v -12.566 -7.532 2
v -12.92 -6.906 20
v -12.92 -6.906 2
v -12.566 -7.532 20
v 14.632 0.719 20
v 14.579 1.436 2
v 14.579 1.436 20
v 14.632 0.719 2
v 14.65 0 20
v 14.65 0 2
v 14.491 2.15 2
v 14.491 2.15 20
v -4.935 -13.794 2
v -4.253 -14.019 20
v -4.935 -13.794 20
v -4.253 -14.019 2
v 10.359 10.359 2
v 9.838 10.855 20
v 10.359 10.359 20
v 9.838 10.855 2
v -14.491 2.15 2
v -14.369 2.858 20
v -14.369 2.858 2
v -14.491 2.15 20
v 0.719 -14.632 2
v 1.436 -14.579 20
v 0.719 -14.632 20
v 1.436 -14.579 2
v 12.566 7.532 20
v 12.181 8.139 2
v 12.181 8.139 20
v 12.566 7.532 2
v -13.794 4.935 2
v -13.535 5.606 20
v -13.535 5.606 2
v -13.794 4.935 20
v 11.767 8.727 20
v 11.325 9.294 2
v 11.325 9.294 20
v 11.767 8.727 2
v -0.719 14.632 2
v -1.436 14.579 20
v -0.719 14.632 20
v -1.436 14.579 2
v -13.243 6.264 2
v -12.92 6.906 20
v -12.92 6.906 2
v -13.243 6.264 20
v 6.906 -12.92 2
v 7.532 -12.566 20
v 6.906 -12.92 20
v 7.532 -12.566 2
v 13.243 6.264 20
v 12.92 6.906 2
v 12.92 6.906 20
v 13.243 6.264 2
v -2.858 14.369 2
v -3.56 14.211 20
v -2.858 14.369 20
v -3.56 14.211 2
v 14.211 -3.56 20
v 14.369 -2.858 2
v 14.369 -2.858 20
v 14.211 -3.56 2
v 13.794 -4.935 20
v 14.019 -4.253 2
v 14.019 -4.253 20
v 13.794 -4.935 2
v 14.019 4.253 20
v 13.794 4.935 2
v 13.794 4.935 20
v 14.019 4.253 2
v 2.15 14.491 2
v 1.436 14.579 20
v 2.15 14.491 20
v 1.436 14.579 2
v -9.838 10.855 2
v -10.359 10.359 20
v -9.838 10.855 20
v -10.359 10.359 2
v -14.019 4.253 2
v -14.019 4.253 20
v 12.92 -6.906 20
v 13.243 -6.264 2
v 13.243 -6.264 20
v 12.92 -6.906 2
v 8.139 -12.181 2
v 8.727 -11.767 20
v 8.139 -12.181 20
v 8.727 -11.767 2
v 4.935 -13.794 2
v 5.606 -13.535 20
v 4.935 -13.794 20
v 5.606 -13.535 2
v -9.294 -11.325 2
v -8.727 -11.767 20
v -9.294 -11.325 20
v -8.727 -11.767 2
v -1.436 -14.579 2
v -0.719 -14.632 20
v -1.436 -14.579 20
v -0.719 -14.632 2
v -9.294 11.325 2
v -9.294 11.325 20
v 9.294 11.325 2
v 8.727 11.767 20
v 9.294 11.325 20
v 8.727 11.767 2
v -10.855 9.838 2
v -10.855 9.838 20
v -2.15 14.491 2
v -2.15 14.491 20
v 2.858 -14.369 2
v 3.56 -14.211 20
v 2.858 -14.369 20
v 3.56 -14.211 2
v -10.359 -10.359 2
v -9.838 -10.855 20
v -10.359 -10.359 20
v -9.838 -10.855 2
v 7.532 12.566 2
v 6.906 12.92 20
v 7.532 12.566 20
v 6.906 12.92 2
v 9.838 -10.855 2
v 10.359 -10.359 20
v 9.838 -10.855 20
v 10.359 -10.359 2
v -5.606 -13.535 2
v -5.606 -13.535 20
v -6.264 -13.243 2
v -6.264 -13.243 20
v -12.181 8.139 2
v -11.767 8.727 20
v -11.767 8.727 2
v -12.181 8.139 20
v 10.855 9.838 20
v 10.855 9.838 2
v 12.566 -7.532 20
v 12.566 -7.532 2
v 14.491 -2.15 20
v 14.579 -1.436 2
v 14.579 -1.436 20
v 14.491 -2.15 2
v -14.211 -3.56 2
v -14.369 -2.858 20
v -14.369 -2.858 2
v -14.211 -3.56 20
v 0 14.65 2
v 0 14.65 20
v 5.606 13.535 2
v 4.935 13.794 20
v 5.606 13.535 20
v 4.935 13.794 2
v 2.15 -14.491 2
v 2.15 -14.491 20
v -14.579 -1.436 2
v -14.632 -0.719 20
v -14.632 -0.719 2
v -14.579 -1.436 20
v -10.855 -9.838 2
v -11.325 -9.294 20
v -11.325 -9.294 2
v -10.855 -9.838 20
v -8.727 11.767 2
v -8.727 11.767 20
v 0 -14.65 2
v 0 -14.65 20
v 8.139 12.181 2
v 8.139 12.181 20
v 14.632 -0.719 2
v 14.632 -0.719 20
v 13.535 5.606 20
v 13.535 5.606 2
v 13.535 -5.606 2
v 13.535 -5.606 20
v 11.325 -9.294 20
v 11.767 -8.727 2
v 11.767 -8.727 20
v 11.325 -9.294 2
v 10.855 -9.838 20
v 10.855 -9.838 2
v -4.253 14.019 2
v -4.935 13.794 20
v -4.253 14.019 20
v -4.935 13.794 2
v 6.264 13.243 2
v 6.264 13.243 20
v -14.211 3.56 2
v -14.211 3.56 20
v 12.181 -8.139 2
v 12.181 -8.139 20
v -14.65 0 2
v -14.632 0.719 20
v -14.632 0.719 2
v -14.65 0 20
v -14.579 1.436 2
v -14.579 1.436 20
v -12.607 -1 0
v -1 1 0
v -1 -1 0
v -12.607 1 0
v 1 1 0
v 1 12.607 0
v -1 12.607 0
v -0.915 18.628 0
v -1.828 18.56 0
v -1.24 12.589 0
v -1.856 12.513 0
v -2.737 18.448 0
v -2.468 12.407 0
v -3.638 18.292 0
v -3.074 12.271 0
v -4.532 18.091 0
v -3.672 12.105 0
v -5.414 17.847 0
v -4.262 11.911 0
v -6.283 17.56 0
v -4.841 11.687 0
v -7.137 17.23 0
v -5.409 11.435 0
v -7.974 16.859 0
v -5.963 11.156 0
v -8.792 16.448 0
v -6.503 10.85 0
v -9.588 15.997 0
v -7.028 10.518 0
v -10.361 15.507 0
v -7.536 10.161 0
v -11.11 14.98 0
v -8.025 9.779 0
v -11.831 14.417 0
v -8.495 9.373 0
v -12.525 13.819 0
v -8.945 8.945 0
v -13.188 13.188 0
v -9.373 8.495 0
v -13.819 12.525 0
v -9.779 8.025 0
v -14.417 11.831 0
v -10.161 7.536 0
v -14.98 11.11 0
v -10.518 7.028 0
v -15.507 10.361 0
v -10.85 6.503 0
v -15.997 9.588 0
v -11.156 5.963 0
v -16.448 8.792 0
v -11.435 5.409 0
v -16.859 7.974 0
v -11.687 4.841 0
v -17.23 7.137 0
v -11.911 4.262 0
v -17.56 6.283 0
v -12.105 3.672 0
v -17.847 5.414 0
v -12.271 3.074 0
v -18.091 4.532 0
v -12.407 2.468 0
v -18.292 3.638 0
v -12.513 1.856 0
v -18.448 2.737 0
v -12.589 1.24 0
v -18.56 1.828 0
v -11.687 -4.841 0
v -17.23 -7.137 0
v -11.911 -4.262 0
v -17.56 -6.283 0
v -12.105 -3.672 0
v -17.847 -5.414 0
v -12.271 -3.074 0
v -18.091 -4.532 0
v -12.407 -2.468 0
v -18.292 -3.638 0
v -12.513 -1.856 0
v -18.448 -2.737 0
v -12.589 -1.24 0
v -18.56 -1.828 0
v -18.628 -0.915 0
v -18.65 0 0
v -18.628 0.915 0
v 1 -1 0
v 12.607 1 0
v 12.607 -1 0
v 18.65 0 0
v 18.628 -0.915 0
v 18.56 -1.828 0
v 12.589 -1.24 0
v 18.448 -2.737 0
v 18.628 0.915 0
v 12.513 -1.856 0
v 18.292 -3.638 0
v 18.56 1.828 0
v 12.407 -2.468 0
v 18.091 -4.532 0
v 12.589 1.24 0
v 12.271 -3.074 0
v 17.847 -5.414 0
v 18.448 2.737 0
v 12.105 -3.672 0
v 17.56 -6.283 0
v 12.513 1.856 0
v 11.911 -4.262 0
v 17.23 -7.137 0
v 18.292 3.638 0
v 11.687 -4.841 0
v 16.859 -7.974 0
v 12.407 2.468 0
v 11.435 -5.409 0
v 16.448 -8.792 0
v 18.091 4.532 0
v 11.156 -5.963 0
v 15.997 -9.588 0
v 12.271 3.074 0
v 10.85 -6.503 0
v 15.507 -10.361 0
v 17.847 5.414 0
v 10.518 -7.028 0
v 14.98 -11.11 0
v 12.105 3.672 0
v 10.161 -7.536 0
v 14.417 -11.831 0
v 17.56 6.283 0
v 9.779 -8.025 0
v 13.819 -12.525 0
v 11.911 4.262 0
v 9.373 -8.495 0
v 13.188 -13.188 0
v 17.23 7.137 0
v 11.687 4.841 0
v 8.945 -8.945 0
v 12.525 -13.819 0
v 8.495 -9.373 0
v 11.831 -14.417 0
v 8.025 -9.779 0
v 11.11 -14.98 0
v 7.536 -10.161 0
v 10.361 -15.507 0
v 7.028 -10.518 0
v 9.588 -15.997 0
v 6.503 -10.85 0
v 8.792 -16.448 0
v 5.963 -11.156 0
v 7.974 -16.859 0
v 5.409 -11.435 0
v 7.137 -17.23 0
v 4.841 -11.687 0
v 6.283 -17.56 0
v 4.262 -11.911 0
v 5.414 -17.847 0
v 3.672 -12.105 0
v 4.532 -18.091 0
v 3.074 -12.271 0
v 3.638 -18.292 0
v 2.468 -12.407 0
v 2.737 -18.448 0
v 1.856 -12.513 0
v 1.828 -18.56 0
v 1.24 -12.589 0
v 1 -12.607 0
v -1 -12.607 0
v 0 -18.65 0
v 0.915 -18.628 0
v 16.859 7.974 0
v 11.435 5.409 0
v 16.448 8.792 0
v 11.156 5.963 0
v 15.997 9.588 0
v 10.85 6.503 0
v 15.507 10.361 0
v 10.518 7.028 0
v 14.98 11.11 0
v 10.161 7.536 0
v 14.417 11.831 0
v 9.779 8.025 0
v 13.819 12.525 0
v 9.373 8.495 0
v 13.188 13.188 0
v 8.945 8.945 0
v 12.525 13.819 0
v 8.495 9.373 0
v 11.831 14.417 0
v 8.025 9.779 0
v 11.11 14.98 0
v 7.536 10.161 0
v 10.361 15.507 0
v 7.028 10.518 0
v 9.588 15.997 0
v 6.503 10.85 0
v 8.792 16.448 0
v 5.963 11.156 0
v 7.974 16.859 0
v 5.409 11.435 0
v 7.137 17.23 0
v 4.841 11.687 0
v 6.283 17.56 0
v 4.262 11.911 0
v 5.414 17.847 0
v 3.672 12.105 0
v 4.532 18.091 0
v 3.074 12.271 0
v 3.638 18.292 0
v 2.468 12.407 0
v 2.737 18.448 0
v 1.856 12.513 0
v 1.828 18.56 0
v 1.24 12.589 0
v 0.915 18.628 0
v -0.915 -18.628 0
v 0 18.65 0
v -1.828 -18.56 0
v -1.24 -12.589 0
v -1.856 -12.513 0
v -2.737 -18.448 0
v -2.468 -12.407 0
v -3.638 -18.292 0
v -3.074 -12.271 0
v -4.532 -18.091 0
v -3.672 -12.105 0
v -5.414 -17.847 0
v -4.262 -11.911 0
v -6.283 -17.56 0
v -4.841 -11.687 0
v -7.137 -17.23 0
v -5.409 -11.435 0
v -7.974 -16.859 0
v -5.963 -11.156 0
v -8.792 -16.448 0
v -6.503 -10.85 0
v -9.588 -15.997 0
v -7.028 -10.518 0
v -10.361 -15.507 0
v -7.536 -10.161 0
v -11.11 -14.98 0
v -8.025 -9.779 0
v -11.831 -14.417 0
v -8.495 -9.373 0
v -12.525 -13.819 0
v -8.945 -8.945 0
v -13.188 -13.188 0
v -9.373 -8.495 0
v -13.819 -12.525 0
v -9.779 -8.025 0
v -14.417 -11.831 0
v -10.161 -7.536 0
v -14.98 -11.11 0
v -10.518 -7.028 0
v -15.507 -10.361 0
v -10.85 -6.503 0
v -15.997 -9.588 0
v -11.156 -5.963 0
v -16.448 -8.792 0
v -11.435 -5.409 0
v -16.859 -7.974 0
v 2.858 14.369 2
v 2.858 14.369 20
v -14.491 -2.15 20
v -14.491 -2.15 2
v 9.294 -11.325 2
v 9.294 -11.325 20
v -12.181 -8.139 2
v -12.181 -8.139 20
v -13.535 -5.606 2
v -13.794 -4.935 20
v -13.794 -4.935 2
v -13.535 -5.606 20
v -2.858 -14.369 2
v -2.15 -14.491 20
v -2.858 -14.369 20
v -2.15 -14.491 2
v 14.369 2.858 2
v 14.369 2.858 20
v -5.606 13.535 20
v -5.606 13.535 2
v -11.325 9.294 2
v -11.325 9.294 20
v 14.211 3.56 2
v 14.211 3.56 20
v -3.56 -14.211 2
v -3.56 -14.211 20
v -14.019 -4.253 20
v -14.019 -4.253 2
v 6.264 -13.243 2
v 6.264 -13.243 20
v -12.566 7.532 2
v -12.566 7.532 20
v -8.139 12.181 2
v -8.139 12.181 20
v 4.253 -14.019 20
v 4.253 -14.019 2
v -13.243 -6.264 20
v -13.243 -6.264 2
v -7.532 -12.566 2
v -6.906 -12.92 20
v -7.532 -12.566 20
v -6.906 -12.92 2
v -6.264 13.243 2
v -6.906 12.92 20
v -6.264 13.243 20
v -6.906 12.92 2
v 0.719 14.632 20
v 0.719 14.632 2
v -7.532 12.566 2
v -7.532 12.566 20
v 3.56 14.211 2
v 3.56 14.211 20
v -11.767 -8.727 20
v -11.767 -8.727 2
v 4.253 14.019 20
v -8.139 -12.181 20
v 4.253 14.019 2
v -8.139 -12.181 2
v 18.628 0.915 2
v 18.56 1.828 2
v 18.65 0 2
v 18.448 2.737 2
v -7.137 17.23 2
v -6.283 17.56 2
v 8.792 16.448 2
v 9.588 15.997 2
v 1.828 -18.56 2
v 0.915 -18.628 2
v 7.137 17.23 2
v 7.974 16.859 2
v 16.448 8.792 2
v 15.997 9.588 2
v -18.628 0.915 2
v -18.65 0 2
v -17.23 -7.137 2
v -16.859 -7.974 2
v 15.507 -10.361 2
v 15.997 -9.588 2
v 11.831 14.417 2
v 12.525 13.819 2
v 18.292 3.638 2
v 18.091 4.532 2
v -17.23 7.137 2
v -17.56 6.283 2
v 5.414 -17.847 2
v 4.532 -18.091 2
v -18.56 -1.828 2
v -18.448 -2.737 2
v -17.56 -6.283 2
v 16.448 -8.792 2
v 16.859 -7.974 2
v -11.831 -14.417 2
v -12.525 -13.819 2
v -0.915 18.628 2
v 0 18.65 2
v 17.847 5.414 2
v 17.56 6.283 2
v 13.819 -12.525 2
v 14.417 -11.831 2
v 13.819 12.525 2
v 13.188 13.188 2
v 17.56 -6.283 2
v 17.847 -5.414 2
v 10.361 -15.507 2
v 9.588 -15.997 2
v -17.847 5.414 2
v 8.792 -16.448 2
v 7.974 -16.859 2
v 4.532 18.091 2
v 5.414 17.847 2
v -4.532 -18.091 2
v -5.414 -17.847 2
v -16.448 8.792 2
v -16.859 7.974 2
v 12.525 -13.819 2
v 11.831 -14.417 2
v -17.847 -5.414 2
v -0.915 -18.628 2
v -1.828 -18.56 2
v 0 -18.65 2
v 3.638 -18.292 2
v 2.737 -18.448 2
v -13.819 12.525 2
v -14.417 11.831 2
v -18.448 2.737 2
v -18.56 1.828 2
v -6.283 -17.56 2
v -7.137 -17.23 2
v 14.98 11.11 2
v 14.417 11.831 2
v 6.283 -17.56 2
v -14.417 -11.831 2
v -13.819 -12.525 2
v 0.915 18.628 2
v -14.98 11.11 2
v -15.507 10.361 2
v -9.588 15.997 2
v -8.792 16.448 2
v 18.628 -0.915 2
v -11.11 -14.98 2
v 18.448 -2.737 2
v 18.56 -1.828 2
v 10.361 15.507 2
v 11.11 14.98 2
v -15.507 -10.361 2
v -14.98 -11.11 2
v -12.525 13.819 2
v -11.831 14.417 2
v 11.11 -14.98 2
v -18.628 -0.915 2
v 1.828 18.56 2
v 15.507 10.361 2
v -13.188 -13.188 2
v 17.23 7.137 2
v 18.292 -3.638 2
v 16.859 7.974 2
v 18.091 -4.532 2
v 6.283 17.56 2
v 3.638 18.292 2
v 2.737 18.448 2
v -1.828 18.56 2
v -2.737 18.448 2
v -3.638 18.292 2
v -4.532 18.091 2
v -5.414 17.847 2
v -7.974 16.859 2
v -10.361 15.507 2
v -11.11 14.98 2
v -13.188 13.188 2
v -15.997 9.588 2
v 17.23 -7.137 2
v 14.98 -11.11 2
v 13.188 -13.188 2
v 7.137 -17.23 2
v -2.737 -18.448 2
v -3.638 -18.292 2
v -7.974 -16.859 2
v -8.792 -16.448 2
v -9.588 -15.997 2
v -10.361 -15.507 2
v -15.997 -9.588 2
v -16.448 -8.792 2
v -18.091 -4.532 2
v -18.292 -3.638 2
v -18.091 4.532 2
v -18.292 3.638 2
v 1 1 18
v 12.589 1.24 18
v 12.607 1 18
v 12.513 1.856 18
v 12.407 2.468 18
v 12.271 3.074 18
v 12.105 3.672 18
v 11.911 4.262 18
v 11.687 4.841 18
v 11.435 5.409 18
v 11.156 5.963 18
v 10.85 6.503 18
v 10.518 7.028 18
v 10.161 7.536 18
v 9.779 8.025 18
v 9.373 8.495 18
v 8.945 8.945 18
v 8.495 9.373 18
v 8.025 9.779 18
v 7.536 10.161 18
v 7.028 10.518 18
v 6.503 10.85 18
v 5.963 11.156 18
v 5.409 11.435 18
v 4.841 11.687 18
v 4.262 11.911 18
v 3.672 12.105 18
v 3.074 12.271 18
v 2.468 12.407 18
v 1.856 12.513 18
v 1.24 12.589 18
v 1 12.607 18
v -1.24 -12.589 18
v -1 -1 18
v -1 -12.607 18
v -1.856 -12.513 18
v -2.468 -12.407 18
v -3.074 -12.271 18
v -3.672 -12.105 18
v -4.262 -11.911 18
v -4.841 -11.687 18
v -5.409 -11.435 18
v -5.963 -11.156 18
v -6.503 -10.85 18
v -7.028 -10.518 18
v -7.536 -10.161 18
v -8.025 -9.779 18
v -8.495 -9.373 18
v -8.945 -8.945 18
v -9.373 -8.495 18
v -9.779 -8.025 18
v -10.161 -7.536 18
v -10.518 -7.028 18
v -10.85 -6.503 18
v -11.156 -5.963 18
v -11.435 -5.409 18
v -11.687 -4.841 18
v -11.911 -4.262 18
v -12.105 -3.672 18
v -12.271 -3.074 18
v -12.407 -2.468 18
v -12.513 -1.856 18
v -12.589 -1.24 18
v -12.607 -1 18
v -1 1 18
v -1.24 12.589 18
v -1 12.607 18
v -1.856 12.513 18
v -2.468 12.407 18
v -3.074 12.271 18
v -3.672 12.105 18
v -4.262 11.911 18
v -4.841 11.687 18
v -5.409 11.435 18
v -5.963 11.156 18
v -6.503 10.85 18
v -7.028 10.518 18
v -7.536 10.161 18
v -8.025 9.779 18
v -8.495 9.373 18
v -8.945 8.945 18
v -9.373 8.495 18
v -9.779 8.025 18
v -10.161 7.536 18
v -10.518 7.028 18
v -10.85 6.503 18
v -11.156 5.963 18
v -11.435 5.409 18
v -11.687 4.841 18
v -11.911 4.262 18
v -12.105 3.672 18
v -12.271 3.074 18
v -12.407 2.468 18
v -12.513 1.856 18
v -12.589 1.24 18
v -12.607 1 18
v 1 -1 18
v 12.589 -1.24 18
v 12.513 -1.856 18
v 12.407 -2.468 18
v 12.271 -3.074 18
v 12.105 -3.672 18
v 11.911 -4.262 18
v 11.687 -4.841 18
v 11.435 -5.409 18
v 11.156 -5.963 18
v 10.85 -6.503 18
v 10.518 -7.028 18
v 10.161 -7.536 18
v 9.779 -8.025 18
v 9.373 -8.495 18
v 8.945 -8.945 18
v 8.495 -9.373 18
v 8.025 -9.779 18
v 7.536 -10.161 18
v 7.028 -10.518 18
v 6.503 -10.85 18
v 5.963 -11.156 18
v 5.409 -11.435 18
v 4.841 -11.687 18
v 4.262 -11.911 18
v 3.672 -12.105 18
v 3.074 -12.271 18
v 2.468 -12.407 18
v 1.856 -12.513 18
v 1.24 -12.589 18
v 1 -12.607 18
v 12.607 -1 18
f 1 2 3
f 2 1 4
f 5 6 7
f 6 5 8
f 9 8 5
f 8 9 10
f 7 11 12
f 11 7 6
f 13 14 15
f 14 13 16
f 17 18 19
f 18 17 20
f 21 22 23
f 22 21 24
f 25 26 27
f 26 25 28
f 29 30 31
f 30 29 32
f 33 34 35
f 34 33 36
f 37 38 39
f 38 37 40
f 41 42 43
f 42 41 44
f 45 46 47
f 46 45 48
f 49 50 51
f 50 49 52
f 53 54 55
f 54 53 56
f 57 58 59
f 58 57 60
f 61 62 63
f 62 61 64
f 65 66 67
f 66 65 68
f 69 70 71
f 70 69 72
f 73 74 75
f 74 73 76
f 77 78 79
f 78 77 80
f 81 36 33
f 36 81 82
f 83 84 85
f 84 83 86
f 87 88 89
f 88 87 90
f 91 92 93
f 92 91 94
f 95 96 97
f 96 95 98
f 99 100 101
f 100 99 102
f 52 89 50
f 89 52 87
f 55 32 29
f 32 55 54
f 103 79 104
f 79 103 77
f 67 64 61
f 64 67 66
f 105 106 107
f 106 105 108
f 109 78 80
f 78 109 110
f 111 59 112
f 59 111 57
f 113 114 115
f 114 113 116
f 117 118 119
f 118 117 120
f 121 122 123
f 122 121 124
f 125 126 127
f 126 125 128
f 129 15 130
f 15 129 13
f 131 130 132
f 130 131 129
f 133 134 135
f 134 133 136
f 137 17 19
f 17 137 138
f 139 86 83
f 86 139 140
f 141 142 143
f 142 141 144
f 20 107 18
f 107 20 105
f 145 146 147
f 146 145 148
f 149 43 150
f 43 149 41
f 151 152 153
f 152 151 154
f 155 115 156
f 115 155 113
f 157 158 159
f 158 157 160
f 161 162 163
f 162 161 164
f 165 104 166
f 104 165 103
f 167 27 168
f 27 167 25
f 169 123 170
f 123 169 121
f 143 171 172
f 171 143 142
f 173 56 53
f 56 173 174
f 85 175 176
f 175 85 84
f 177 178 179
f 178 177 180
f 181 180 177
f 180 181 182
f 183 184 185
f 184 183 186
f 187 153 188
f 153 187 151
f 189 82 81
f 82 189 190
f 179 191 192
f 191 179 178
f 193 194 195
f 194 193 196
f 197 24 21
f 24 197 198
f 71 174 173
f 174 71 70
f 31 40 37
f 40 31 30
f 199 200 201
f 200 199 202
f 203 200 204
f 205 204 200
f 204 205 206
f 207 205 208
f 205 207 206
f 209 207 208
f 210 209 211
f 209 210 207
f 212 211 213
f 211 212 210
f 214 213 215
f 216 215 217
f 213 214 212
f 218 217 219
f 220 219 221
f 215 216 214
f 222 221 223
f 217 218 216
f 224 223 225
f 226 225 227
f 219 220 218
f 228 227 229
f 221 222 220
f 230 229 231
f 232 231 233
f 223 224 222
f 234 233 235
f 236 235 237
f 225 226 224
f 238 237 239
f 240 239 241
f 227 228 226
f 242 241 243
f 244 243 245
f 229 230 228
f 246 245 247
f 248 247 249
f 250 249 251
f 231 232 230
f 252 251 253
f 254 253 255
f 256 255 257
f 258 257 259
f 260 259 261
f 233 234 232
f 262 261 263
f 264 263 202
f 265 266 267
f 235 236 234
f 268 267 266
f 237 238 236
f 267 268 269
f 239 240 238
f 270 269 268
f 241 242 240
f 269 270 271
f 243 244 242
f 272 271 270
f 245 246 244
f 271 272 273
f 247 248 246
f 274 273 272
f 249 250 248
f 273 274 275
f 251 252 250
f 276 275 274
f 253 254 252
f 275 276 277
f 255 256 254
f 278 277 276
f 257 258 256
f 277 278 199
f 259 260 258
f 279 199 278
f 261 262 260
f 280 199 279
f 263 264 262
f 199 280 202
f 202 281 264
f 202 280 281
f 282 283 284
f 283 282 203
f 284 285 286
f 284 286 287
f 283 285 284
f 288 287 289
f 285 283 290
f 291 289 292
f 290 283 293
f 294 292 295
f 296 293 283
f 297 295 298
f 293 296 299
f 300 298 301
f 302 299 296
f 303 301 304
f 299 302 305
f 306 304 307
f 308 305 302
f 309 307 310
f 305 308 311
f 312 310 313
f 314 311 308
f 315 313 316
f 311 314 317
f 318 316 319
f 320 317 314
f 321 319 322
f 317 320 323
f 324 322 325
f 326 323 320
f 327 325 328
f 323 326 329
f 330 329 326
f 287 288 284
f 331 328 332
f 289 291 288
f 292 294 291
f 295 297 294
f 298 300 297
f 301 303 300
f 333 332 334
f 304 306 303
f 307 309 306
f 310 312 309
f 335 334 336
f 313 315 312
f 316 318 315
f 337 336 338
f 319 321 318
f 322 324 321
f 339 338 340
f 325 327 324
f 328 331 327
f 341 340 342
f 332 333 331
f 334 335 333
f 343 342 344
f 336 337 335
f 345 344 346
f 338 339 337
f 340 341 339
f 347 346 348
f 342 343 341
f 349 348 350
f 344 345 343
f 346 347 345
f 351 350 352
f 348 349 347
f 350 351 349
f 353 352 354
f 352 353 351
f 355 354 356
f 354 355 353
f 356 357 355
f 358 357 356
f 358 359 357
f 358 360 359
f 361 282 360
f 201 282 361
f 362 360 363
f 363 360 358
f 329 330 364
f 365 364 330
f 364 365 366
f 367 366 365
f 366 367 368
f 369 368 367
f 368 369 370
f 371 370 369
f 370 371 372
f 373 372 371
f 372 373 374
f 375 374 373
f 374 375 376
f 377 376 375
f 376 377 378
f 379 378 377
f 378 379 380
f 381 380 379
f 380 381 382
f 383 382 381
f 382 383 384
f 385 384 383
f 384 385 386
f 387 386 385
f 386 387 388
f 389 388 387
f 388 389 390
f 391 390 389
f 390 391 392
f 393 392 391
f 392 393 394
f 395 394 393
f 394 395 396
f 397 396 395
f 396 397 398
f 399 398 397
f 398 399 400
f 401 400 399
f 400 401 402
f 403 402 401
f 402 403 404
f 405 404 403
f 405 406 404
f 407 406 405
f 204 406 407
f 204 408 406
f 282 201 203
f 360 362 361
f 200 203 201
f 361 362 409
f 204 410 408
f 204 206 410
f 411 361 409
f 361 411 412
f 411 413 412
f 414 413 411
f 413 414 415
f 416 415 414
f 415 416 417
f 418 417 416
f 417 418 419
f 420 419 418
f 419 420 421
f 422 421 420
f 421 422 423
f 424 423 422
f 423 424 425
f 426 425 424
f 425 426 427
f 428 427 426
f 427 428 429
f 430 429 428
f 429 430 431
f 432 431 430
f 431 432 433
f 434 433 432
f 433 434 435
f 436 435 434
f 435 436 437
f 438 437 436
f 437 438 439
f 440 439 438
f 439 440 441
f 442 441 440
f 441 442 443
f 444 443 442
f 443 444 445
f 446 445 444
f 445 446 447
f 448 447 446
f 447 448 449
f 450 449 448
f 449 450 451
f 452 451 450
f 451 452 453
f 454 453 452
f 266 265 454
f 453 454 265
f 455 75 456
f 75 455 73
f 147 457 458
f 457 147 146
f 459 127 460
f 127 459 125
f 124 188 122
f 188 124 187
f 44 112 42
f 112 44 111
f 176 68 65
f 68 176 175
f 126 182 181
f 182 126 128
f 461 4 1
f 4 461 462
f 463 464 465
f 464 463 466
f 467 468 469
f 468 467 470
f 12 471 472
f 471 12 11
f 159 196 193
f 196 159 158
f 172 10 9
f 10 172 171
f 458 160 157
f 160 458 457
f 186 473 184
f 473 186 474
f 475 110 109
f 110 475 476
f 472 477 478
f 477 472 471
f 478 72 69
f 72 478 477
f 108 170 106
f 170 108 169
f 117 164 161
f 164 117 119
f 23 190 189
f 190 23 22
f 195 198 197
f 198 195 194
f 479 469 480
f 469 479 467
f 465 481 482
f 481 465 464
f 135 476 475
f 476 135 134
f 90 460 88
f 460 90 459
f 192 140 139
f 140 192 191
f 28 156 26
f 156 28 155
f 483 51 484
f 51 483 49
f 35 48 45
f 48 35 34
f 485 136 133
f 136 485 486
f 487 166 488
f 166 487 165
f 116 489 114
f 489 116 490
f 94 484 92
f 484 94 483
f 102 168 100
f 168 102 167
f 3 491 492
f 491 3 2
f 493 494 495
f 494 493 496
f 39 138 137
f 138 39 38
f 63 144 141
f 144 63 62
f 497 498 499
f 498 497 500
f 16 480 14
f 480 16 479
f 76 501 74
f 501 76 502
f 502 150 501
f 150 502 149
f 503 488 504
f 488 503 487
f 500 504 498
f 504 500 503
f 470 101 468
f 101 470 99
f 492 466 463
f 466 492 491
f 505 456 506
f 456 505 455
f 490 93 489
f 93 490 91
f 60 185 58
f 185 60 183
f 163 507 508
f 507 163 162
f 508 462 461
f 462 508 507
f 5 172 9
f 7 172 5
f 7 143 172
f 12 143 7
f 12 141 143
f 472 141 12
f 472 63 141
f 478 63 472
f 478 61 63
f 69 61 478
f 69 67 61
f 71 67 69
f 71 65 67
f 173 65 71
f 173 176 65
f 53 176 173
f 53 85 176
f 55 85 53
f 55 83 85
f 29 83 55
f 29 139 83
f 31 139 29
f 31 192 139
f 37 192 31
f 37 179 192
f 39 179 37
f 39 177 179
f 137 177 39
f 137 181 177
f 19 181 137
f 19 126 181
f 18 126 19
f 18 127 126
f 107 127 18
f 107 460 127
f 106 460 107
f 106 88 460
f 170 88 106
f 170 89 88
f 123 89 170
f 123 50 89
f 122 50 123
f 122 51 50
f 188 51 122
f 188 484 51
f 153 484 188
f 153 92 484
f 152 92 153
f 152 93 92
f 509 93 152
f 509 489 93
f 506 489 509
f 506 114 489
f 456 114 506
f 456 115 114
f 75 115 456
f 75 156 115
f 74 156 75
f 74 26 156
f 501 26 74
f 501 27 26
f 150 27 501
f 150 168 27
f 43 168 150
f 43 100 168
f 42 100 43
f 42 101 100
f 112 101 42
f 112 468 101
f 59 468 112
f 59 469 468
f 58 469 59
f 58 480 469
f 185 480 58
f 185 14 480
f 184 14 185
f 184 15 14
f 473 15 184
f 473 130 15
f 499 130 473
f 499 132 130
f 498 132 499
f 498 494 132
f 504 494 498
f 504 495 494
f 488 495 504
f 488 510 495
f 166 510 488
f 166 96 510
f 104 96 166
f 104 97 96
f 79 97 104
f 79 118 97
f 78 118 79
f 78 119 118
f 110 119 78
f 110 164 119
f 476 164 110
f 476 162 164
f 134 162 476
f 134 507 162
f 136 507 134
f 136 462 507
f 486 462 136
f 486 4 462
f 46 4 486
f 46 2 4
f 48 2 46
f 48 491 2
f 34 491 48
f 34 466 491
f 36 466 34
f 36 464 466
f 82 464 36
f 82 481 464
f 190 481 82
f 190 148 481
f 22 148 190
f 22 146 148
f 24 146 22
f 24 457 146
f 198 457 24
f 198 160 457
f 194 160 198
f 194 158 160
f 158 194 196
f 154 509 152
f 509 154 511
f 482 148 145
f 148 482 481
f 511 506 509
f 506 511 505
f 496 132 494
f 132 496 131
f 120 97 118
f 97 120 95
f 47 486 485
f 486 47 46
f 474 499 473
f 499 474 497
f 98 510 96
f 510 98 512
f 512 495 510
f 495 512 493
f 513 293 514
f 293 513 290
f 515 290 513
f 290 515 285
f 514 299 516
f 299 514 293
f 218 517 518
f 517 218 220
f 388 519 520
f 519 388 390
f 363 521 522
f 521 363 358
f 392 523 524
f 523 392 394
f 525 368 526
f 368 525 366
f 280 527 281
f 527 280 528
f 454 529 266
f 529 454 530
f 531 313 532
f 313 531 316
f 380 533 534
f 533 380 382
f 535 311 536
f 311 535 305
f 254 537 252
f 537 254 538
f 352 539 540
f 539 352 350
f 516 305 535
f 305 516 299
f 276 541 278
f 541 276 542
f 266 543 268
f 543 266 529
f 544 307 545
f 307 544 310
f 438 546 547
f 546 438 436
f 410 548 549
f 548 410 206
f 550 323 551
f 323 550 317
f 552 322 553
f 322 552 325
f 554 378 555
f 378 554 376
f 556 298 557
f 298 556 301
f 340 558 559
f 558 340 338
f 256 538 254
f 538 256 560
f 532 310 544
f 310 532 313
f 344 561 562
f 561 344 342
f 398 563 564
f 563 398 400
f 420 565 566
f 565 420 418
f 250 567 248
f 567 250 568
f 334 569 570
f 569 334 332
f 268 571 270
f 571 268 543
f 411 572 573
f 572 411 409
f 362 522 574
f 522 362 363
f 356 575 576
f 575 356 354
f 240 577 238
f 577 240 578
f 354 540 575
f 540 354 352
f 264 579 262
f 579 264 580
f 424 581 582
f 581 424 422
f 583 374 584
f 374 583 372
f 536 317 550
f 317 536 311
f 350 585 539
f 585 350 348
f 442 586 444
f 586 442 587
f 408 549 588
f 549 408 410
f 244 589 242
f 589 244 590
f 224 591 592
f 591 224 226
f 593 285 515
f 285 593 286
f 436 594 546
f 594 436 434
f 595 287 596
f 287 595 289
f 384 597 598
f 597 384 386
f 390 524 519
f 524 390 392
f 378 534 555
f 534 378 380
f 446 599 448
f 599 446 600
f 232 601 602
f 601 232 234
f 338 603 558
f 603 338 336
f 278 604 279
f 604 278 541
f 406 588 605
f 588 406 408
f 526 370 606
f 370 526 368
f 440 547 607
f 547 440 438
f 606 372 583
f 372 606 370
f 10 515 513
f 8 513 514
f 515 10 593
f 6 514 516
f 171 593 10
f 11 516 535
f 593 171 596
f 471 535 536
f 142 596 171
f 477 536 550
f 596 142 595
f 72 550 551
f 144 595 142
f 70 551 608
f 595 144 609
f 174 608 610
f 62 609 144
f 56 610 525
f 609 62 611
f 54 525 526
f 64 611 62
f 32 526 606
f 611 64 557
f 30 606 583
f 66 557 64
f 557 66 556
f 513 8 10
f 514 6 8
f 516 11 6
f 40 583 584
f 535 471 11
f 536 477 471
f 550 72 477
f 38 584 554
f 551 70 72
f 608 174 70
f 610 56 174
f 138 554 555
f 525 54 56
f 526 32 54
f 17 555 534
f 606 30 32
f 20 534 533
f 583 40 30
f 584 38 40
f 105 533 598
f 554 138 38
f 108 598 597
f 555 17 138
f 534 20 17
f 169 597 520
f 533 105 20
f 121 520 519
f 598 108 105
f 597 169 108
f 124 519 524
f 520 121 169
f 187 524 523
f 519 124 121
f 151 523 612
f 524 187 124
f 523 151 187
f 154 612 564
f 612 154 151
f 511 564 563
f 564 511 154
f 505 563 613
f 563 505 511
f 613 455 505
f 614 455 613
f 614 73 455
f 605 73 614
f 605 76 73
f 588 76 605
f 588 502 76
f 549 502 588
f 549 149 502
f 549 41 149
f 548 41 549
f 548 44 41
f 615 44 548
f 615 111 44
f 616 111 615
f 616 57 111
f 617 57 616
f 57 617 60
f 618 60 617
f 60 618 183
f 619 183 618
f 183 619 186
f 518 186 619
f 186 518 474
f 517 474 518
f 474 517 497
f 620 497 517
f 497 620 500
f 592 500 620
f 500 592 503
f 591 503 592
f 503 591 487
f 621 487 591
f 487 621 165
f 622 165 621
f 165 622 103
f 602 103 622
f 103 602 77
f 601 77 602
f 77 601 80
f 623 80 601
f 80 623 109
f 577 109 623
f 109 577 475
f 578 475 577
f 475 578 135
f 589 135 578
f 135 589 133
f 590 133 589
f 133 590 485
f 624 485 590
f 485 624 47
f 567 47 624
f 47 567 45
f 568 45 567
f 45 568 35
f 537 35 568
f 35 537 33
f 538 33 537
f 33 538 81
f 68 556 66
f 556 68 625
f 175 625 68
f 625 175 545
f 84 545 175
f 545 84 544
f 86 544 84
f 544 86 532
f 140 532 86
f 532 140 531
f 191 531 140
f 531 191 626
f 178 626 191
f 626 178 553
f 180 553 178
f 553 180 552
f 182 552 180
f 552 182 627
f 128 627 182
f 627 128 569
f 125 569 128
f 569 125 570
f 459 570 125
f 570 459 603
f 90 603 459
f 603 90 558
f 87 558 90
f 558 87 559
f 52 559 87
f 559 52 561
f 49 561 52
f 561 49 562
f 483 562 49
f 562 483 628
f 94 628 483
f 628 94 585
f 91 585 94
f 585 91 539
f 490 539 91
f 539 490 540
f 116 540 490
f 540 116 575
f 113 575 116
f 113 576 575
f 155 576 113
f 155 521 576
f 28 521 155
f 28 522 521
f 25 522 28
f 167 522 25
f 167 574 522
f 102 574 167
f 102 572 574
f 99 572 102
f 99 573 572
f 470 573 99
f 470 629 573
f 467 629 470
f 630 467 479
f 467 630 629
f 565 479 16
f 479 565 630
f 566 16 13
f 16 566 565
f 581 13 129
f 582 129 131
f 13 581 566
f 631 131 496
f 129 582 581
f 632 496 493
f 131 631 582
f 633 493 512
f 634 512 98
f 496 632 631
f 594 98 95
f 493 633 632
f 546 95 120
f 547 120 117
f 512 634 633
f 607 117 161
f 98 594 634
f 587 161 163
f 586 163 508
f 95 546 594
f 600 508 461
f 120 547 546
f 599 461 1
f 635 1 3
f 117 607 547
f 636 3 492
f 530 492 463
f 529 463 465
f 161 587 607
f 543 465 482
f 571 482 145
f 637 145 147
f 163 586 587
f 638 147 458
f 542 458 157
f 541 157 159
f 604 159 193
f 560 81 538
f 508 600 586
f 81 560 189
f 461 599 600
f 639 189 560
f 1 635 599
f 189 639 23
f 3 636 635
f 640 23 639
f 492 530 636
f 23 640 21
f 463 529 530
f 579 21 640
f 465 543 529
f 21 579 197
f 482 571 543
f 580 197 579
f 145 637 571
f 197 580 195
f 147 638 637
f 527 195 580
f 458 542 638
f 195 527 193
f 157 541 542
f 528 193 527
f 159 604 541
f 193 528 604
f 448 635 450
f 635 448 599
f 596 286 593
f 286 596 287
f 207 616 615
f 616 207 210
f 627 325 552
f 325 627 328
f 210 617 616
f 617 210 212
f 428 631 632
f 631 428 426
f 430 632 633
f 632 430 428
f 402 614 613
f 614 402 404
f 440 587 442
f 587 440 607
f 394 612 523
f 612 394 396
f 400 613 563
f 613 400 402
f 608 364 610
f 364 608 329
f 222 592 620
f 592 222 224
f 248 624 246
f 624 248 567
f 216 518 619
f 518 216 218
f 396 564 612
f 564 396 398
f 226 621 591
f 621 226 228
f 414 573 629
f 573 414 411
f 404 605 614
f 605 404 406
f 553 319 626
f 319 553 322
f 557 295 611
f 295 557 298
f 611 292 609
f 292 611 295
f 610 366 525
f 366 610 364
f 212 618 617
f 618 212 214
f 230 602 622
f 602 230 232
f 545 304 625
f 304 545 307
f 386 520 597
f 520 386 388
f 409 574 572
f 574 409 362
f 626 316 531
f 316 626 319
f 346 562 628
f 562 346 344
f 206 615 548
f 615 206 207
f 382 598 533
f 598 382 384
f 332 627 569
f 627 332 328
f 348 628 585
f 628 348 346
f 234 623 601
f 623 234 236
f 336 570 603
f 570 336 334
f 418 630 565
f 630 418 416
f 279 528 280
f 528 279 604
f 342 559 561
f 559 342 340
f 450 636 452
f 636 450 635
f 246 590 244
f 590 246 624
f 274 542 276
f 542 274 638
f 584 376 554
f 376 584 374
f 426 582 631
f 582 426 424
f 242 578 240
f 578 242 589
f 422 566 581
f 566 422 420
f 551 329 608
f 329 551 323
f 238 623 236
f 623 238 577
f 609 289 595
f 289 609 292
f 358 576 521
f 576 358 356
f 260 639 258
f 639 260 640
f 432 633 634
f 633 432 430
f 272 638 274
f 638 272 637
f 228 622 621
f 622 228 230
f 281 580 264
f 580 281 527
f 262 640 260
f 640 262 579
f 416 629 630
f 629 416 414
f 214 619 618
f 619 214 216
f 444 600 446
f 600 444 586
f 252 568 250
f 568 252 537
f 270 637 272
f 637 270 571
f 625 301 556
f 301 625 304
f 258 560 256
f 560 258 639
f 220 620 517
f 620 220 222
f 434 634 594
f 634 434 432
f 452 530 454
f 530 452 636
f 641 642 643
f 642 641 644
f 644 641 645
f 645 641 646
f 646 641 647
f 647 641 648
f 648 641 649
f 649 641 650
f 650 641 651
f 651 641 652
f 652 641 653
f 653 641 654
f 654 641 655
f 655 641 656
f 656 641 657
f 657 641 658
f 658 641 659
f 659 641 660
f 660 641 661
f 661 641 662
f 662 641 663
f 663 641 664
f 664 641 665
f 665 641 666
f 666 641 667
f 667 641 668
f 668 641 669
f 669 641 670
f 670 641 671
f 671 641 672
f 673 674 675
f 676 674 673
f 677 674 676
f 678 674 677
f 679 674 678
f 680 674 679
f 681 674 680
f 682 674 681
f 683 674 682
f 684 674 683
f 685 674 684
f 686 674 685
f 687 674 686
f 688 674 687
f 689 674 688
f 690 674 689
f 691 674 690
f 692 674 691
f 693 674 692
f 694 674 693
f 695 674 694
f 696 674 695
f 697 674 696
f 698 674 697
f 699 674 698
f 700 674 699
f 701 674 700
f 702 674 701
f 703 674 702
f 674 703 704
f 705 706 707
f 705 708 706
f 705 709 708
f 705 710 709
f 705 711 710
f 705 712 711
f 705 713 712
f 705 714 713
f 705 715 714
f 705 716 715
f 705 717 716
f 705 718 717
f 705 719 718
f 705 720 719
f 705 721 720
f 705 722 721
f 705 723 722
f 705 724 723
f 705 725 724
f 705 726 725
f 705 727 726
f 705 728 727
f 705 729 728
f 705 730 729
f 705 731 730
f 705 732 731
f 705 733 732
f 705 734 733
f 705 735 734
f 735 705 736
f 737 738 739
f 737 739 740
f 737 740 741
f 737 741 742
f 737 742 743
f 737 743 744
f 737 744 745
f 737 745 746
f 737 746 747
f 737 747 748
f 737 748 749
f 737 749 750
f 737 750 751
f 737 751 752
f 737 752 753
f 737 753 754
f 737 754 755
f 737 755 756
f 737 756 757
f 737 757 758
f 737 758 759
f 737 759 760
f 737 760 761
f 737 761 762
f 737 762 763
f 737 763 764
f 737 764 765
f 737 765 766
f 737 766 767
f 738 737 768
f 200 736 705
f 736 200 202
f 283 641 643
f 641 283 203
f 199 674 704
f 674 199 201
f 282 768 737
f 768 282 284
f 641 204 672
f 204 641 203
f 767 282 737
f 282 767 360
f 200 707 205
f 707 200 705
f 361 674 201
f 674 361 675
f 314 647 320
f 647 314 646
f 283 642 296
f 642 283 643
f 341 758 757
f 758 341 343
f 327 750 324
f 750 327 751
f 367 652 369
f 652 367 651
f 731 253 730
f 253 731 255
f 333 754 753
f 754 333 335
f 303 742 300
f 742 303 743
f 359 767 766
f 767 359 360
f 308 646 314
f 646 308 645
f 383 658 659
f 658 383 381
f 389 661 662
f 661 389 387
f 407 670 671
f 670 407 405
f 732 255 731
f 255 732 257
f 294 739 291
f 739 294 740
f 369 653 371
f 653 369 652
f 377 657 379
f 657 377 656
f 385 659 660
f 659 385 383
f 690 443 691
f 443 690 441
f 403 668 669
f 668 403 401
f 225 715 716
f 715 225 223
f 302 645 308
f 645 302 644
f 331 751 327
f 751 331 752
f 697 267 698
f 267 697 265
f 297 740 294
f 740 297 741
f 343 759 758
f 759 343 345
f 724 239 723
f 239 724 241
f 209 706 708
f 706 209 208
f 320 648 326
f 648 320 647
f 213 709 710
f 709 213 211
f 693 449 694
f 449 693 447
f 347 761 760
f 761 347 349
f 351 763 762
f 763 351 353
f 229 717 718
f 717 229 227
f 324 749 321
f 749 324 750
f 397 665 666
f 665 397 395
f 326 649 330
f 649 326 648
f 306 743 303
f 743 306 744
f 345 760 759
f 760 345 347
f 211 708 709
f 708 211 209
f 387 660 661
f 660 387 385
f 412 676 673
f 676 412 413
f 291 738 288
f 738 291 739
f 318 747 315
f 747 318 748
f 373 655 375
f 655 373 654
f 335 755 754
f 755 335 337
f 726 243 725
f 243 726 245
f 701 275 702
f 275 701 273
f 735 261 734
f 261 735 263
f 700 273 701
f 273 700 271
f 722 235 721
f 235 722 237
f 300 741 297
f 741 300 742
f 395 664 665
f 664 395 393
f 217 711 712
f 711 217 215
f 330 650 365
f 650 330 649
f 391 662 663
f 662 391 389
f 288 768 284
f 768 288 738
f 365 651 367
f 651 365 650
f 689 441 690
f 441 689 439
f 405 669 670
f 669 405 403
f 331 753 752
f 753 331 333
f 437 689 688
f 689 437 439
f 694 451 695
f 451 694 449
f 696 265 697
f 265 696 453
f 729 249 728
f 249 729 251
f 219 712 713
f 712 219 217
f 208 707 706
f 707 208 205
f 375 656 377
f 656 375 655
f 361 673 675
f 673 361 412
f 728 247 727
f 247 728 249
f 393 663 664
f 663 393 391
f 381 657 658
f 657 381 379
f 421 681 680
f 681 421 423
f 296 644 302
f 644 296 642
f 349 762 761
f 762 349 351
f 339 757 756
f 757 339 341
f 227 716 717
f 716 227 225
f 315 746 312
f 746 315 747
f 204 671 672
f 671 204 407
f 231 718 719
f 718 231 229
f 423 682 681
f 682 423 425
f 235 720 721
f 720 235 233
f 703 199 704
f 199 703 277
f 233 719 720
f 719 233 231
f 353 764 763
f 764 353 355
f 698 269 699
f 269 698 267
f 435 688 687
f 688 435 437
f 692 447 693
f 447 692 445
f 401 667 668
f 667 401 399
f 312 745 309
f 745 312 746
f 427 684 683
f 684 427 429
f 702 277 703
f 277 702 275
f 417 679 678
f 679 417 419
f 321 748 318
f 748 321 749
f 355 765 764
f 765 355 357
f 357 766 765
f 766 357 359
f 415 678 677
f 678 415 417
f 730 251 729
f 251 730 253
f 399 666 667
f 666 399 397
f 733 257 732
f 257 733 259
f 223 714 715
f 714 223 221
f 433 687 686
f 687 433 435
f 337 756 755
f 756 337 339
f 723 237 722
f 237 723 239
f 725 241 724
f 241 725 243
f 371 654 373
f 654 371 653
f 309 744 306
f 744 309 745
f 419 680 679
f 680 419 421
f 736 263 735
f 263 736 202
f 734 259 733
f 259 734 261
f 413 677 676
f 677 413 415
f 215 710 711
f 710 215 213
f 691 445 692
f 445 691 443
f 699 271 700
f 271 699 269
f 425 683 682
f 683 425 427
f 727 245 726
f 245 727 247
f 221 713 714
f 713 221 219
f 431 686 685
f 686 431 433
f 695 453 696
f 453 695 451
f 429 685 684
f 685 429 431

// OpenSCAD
$fn=128;

difference() {
  union() {
    cylinder(h=20, d=29.3);
    cylinder(h=2, d=37.3);
  }
  difference() {
    cylinder(h=18, d=29.3-4);
    union() {
      translate([0, 0, 9]) cube([29.3-4, 2, 18], center=true);
      translate([0, 0, 9]) cube([2, 29.3-4, 18], center=true);
    }
  }
}
